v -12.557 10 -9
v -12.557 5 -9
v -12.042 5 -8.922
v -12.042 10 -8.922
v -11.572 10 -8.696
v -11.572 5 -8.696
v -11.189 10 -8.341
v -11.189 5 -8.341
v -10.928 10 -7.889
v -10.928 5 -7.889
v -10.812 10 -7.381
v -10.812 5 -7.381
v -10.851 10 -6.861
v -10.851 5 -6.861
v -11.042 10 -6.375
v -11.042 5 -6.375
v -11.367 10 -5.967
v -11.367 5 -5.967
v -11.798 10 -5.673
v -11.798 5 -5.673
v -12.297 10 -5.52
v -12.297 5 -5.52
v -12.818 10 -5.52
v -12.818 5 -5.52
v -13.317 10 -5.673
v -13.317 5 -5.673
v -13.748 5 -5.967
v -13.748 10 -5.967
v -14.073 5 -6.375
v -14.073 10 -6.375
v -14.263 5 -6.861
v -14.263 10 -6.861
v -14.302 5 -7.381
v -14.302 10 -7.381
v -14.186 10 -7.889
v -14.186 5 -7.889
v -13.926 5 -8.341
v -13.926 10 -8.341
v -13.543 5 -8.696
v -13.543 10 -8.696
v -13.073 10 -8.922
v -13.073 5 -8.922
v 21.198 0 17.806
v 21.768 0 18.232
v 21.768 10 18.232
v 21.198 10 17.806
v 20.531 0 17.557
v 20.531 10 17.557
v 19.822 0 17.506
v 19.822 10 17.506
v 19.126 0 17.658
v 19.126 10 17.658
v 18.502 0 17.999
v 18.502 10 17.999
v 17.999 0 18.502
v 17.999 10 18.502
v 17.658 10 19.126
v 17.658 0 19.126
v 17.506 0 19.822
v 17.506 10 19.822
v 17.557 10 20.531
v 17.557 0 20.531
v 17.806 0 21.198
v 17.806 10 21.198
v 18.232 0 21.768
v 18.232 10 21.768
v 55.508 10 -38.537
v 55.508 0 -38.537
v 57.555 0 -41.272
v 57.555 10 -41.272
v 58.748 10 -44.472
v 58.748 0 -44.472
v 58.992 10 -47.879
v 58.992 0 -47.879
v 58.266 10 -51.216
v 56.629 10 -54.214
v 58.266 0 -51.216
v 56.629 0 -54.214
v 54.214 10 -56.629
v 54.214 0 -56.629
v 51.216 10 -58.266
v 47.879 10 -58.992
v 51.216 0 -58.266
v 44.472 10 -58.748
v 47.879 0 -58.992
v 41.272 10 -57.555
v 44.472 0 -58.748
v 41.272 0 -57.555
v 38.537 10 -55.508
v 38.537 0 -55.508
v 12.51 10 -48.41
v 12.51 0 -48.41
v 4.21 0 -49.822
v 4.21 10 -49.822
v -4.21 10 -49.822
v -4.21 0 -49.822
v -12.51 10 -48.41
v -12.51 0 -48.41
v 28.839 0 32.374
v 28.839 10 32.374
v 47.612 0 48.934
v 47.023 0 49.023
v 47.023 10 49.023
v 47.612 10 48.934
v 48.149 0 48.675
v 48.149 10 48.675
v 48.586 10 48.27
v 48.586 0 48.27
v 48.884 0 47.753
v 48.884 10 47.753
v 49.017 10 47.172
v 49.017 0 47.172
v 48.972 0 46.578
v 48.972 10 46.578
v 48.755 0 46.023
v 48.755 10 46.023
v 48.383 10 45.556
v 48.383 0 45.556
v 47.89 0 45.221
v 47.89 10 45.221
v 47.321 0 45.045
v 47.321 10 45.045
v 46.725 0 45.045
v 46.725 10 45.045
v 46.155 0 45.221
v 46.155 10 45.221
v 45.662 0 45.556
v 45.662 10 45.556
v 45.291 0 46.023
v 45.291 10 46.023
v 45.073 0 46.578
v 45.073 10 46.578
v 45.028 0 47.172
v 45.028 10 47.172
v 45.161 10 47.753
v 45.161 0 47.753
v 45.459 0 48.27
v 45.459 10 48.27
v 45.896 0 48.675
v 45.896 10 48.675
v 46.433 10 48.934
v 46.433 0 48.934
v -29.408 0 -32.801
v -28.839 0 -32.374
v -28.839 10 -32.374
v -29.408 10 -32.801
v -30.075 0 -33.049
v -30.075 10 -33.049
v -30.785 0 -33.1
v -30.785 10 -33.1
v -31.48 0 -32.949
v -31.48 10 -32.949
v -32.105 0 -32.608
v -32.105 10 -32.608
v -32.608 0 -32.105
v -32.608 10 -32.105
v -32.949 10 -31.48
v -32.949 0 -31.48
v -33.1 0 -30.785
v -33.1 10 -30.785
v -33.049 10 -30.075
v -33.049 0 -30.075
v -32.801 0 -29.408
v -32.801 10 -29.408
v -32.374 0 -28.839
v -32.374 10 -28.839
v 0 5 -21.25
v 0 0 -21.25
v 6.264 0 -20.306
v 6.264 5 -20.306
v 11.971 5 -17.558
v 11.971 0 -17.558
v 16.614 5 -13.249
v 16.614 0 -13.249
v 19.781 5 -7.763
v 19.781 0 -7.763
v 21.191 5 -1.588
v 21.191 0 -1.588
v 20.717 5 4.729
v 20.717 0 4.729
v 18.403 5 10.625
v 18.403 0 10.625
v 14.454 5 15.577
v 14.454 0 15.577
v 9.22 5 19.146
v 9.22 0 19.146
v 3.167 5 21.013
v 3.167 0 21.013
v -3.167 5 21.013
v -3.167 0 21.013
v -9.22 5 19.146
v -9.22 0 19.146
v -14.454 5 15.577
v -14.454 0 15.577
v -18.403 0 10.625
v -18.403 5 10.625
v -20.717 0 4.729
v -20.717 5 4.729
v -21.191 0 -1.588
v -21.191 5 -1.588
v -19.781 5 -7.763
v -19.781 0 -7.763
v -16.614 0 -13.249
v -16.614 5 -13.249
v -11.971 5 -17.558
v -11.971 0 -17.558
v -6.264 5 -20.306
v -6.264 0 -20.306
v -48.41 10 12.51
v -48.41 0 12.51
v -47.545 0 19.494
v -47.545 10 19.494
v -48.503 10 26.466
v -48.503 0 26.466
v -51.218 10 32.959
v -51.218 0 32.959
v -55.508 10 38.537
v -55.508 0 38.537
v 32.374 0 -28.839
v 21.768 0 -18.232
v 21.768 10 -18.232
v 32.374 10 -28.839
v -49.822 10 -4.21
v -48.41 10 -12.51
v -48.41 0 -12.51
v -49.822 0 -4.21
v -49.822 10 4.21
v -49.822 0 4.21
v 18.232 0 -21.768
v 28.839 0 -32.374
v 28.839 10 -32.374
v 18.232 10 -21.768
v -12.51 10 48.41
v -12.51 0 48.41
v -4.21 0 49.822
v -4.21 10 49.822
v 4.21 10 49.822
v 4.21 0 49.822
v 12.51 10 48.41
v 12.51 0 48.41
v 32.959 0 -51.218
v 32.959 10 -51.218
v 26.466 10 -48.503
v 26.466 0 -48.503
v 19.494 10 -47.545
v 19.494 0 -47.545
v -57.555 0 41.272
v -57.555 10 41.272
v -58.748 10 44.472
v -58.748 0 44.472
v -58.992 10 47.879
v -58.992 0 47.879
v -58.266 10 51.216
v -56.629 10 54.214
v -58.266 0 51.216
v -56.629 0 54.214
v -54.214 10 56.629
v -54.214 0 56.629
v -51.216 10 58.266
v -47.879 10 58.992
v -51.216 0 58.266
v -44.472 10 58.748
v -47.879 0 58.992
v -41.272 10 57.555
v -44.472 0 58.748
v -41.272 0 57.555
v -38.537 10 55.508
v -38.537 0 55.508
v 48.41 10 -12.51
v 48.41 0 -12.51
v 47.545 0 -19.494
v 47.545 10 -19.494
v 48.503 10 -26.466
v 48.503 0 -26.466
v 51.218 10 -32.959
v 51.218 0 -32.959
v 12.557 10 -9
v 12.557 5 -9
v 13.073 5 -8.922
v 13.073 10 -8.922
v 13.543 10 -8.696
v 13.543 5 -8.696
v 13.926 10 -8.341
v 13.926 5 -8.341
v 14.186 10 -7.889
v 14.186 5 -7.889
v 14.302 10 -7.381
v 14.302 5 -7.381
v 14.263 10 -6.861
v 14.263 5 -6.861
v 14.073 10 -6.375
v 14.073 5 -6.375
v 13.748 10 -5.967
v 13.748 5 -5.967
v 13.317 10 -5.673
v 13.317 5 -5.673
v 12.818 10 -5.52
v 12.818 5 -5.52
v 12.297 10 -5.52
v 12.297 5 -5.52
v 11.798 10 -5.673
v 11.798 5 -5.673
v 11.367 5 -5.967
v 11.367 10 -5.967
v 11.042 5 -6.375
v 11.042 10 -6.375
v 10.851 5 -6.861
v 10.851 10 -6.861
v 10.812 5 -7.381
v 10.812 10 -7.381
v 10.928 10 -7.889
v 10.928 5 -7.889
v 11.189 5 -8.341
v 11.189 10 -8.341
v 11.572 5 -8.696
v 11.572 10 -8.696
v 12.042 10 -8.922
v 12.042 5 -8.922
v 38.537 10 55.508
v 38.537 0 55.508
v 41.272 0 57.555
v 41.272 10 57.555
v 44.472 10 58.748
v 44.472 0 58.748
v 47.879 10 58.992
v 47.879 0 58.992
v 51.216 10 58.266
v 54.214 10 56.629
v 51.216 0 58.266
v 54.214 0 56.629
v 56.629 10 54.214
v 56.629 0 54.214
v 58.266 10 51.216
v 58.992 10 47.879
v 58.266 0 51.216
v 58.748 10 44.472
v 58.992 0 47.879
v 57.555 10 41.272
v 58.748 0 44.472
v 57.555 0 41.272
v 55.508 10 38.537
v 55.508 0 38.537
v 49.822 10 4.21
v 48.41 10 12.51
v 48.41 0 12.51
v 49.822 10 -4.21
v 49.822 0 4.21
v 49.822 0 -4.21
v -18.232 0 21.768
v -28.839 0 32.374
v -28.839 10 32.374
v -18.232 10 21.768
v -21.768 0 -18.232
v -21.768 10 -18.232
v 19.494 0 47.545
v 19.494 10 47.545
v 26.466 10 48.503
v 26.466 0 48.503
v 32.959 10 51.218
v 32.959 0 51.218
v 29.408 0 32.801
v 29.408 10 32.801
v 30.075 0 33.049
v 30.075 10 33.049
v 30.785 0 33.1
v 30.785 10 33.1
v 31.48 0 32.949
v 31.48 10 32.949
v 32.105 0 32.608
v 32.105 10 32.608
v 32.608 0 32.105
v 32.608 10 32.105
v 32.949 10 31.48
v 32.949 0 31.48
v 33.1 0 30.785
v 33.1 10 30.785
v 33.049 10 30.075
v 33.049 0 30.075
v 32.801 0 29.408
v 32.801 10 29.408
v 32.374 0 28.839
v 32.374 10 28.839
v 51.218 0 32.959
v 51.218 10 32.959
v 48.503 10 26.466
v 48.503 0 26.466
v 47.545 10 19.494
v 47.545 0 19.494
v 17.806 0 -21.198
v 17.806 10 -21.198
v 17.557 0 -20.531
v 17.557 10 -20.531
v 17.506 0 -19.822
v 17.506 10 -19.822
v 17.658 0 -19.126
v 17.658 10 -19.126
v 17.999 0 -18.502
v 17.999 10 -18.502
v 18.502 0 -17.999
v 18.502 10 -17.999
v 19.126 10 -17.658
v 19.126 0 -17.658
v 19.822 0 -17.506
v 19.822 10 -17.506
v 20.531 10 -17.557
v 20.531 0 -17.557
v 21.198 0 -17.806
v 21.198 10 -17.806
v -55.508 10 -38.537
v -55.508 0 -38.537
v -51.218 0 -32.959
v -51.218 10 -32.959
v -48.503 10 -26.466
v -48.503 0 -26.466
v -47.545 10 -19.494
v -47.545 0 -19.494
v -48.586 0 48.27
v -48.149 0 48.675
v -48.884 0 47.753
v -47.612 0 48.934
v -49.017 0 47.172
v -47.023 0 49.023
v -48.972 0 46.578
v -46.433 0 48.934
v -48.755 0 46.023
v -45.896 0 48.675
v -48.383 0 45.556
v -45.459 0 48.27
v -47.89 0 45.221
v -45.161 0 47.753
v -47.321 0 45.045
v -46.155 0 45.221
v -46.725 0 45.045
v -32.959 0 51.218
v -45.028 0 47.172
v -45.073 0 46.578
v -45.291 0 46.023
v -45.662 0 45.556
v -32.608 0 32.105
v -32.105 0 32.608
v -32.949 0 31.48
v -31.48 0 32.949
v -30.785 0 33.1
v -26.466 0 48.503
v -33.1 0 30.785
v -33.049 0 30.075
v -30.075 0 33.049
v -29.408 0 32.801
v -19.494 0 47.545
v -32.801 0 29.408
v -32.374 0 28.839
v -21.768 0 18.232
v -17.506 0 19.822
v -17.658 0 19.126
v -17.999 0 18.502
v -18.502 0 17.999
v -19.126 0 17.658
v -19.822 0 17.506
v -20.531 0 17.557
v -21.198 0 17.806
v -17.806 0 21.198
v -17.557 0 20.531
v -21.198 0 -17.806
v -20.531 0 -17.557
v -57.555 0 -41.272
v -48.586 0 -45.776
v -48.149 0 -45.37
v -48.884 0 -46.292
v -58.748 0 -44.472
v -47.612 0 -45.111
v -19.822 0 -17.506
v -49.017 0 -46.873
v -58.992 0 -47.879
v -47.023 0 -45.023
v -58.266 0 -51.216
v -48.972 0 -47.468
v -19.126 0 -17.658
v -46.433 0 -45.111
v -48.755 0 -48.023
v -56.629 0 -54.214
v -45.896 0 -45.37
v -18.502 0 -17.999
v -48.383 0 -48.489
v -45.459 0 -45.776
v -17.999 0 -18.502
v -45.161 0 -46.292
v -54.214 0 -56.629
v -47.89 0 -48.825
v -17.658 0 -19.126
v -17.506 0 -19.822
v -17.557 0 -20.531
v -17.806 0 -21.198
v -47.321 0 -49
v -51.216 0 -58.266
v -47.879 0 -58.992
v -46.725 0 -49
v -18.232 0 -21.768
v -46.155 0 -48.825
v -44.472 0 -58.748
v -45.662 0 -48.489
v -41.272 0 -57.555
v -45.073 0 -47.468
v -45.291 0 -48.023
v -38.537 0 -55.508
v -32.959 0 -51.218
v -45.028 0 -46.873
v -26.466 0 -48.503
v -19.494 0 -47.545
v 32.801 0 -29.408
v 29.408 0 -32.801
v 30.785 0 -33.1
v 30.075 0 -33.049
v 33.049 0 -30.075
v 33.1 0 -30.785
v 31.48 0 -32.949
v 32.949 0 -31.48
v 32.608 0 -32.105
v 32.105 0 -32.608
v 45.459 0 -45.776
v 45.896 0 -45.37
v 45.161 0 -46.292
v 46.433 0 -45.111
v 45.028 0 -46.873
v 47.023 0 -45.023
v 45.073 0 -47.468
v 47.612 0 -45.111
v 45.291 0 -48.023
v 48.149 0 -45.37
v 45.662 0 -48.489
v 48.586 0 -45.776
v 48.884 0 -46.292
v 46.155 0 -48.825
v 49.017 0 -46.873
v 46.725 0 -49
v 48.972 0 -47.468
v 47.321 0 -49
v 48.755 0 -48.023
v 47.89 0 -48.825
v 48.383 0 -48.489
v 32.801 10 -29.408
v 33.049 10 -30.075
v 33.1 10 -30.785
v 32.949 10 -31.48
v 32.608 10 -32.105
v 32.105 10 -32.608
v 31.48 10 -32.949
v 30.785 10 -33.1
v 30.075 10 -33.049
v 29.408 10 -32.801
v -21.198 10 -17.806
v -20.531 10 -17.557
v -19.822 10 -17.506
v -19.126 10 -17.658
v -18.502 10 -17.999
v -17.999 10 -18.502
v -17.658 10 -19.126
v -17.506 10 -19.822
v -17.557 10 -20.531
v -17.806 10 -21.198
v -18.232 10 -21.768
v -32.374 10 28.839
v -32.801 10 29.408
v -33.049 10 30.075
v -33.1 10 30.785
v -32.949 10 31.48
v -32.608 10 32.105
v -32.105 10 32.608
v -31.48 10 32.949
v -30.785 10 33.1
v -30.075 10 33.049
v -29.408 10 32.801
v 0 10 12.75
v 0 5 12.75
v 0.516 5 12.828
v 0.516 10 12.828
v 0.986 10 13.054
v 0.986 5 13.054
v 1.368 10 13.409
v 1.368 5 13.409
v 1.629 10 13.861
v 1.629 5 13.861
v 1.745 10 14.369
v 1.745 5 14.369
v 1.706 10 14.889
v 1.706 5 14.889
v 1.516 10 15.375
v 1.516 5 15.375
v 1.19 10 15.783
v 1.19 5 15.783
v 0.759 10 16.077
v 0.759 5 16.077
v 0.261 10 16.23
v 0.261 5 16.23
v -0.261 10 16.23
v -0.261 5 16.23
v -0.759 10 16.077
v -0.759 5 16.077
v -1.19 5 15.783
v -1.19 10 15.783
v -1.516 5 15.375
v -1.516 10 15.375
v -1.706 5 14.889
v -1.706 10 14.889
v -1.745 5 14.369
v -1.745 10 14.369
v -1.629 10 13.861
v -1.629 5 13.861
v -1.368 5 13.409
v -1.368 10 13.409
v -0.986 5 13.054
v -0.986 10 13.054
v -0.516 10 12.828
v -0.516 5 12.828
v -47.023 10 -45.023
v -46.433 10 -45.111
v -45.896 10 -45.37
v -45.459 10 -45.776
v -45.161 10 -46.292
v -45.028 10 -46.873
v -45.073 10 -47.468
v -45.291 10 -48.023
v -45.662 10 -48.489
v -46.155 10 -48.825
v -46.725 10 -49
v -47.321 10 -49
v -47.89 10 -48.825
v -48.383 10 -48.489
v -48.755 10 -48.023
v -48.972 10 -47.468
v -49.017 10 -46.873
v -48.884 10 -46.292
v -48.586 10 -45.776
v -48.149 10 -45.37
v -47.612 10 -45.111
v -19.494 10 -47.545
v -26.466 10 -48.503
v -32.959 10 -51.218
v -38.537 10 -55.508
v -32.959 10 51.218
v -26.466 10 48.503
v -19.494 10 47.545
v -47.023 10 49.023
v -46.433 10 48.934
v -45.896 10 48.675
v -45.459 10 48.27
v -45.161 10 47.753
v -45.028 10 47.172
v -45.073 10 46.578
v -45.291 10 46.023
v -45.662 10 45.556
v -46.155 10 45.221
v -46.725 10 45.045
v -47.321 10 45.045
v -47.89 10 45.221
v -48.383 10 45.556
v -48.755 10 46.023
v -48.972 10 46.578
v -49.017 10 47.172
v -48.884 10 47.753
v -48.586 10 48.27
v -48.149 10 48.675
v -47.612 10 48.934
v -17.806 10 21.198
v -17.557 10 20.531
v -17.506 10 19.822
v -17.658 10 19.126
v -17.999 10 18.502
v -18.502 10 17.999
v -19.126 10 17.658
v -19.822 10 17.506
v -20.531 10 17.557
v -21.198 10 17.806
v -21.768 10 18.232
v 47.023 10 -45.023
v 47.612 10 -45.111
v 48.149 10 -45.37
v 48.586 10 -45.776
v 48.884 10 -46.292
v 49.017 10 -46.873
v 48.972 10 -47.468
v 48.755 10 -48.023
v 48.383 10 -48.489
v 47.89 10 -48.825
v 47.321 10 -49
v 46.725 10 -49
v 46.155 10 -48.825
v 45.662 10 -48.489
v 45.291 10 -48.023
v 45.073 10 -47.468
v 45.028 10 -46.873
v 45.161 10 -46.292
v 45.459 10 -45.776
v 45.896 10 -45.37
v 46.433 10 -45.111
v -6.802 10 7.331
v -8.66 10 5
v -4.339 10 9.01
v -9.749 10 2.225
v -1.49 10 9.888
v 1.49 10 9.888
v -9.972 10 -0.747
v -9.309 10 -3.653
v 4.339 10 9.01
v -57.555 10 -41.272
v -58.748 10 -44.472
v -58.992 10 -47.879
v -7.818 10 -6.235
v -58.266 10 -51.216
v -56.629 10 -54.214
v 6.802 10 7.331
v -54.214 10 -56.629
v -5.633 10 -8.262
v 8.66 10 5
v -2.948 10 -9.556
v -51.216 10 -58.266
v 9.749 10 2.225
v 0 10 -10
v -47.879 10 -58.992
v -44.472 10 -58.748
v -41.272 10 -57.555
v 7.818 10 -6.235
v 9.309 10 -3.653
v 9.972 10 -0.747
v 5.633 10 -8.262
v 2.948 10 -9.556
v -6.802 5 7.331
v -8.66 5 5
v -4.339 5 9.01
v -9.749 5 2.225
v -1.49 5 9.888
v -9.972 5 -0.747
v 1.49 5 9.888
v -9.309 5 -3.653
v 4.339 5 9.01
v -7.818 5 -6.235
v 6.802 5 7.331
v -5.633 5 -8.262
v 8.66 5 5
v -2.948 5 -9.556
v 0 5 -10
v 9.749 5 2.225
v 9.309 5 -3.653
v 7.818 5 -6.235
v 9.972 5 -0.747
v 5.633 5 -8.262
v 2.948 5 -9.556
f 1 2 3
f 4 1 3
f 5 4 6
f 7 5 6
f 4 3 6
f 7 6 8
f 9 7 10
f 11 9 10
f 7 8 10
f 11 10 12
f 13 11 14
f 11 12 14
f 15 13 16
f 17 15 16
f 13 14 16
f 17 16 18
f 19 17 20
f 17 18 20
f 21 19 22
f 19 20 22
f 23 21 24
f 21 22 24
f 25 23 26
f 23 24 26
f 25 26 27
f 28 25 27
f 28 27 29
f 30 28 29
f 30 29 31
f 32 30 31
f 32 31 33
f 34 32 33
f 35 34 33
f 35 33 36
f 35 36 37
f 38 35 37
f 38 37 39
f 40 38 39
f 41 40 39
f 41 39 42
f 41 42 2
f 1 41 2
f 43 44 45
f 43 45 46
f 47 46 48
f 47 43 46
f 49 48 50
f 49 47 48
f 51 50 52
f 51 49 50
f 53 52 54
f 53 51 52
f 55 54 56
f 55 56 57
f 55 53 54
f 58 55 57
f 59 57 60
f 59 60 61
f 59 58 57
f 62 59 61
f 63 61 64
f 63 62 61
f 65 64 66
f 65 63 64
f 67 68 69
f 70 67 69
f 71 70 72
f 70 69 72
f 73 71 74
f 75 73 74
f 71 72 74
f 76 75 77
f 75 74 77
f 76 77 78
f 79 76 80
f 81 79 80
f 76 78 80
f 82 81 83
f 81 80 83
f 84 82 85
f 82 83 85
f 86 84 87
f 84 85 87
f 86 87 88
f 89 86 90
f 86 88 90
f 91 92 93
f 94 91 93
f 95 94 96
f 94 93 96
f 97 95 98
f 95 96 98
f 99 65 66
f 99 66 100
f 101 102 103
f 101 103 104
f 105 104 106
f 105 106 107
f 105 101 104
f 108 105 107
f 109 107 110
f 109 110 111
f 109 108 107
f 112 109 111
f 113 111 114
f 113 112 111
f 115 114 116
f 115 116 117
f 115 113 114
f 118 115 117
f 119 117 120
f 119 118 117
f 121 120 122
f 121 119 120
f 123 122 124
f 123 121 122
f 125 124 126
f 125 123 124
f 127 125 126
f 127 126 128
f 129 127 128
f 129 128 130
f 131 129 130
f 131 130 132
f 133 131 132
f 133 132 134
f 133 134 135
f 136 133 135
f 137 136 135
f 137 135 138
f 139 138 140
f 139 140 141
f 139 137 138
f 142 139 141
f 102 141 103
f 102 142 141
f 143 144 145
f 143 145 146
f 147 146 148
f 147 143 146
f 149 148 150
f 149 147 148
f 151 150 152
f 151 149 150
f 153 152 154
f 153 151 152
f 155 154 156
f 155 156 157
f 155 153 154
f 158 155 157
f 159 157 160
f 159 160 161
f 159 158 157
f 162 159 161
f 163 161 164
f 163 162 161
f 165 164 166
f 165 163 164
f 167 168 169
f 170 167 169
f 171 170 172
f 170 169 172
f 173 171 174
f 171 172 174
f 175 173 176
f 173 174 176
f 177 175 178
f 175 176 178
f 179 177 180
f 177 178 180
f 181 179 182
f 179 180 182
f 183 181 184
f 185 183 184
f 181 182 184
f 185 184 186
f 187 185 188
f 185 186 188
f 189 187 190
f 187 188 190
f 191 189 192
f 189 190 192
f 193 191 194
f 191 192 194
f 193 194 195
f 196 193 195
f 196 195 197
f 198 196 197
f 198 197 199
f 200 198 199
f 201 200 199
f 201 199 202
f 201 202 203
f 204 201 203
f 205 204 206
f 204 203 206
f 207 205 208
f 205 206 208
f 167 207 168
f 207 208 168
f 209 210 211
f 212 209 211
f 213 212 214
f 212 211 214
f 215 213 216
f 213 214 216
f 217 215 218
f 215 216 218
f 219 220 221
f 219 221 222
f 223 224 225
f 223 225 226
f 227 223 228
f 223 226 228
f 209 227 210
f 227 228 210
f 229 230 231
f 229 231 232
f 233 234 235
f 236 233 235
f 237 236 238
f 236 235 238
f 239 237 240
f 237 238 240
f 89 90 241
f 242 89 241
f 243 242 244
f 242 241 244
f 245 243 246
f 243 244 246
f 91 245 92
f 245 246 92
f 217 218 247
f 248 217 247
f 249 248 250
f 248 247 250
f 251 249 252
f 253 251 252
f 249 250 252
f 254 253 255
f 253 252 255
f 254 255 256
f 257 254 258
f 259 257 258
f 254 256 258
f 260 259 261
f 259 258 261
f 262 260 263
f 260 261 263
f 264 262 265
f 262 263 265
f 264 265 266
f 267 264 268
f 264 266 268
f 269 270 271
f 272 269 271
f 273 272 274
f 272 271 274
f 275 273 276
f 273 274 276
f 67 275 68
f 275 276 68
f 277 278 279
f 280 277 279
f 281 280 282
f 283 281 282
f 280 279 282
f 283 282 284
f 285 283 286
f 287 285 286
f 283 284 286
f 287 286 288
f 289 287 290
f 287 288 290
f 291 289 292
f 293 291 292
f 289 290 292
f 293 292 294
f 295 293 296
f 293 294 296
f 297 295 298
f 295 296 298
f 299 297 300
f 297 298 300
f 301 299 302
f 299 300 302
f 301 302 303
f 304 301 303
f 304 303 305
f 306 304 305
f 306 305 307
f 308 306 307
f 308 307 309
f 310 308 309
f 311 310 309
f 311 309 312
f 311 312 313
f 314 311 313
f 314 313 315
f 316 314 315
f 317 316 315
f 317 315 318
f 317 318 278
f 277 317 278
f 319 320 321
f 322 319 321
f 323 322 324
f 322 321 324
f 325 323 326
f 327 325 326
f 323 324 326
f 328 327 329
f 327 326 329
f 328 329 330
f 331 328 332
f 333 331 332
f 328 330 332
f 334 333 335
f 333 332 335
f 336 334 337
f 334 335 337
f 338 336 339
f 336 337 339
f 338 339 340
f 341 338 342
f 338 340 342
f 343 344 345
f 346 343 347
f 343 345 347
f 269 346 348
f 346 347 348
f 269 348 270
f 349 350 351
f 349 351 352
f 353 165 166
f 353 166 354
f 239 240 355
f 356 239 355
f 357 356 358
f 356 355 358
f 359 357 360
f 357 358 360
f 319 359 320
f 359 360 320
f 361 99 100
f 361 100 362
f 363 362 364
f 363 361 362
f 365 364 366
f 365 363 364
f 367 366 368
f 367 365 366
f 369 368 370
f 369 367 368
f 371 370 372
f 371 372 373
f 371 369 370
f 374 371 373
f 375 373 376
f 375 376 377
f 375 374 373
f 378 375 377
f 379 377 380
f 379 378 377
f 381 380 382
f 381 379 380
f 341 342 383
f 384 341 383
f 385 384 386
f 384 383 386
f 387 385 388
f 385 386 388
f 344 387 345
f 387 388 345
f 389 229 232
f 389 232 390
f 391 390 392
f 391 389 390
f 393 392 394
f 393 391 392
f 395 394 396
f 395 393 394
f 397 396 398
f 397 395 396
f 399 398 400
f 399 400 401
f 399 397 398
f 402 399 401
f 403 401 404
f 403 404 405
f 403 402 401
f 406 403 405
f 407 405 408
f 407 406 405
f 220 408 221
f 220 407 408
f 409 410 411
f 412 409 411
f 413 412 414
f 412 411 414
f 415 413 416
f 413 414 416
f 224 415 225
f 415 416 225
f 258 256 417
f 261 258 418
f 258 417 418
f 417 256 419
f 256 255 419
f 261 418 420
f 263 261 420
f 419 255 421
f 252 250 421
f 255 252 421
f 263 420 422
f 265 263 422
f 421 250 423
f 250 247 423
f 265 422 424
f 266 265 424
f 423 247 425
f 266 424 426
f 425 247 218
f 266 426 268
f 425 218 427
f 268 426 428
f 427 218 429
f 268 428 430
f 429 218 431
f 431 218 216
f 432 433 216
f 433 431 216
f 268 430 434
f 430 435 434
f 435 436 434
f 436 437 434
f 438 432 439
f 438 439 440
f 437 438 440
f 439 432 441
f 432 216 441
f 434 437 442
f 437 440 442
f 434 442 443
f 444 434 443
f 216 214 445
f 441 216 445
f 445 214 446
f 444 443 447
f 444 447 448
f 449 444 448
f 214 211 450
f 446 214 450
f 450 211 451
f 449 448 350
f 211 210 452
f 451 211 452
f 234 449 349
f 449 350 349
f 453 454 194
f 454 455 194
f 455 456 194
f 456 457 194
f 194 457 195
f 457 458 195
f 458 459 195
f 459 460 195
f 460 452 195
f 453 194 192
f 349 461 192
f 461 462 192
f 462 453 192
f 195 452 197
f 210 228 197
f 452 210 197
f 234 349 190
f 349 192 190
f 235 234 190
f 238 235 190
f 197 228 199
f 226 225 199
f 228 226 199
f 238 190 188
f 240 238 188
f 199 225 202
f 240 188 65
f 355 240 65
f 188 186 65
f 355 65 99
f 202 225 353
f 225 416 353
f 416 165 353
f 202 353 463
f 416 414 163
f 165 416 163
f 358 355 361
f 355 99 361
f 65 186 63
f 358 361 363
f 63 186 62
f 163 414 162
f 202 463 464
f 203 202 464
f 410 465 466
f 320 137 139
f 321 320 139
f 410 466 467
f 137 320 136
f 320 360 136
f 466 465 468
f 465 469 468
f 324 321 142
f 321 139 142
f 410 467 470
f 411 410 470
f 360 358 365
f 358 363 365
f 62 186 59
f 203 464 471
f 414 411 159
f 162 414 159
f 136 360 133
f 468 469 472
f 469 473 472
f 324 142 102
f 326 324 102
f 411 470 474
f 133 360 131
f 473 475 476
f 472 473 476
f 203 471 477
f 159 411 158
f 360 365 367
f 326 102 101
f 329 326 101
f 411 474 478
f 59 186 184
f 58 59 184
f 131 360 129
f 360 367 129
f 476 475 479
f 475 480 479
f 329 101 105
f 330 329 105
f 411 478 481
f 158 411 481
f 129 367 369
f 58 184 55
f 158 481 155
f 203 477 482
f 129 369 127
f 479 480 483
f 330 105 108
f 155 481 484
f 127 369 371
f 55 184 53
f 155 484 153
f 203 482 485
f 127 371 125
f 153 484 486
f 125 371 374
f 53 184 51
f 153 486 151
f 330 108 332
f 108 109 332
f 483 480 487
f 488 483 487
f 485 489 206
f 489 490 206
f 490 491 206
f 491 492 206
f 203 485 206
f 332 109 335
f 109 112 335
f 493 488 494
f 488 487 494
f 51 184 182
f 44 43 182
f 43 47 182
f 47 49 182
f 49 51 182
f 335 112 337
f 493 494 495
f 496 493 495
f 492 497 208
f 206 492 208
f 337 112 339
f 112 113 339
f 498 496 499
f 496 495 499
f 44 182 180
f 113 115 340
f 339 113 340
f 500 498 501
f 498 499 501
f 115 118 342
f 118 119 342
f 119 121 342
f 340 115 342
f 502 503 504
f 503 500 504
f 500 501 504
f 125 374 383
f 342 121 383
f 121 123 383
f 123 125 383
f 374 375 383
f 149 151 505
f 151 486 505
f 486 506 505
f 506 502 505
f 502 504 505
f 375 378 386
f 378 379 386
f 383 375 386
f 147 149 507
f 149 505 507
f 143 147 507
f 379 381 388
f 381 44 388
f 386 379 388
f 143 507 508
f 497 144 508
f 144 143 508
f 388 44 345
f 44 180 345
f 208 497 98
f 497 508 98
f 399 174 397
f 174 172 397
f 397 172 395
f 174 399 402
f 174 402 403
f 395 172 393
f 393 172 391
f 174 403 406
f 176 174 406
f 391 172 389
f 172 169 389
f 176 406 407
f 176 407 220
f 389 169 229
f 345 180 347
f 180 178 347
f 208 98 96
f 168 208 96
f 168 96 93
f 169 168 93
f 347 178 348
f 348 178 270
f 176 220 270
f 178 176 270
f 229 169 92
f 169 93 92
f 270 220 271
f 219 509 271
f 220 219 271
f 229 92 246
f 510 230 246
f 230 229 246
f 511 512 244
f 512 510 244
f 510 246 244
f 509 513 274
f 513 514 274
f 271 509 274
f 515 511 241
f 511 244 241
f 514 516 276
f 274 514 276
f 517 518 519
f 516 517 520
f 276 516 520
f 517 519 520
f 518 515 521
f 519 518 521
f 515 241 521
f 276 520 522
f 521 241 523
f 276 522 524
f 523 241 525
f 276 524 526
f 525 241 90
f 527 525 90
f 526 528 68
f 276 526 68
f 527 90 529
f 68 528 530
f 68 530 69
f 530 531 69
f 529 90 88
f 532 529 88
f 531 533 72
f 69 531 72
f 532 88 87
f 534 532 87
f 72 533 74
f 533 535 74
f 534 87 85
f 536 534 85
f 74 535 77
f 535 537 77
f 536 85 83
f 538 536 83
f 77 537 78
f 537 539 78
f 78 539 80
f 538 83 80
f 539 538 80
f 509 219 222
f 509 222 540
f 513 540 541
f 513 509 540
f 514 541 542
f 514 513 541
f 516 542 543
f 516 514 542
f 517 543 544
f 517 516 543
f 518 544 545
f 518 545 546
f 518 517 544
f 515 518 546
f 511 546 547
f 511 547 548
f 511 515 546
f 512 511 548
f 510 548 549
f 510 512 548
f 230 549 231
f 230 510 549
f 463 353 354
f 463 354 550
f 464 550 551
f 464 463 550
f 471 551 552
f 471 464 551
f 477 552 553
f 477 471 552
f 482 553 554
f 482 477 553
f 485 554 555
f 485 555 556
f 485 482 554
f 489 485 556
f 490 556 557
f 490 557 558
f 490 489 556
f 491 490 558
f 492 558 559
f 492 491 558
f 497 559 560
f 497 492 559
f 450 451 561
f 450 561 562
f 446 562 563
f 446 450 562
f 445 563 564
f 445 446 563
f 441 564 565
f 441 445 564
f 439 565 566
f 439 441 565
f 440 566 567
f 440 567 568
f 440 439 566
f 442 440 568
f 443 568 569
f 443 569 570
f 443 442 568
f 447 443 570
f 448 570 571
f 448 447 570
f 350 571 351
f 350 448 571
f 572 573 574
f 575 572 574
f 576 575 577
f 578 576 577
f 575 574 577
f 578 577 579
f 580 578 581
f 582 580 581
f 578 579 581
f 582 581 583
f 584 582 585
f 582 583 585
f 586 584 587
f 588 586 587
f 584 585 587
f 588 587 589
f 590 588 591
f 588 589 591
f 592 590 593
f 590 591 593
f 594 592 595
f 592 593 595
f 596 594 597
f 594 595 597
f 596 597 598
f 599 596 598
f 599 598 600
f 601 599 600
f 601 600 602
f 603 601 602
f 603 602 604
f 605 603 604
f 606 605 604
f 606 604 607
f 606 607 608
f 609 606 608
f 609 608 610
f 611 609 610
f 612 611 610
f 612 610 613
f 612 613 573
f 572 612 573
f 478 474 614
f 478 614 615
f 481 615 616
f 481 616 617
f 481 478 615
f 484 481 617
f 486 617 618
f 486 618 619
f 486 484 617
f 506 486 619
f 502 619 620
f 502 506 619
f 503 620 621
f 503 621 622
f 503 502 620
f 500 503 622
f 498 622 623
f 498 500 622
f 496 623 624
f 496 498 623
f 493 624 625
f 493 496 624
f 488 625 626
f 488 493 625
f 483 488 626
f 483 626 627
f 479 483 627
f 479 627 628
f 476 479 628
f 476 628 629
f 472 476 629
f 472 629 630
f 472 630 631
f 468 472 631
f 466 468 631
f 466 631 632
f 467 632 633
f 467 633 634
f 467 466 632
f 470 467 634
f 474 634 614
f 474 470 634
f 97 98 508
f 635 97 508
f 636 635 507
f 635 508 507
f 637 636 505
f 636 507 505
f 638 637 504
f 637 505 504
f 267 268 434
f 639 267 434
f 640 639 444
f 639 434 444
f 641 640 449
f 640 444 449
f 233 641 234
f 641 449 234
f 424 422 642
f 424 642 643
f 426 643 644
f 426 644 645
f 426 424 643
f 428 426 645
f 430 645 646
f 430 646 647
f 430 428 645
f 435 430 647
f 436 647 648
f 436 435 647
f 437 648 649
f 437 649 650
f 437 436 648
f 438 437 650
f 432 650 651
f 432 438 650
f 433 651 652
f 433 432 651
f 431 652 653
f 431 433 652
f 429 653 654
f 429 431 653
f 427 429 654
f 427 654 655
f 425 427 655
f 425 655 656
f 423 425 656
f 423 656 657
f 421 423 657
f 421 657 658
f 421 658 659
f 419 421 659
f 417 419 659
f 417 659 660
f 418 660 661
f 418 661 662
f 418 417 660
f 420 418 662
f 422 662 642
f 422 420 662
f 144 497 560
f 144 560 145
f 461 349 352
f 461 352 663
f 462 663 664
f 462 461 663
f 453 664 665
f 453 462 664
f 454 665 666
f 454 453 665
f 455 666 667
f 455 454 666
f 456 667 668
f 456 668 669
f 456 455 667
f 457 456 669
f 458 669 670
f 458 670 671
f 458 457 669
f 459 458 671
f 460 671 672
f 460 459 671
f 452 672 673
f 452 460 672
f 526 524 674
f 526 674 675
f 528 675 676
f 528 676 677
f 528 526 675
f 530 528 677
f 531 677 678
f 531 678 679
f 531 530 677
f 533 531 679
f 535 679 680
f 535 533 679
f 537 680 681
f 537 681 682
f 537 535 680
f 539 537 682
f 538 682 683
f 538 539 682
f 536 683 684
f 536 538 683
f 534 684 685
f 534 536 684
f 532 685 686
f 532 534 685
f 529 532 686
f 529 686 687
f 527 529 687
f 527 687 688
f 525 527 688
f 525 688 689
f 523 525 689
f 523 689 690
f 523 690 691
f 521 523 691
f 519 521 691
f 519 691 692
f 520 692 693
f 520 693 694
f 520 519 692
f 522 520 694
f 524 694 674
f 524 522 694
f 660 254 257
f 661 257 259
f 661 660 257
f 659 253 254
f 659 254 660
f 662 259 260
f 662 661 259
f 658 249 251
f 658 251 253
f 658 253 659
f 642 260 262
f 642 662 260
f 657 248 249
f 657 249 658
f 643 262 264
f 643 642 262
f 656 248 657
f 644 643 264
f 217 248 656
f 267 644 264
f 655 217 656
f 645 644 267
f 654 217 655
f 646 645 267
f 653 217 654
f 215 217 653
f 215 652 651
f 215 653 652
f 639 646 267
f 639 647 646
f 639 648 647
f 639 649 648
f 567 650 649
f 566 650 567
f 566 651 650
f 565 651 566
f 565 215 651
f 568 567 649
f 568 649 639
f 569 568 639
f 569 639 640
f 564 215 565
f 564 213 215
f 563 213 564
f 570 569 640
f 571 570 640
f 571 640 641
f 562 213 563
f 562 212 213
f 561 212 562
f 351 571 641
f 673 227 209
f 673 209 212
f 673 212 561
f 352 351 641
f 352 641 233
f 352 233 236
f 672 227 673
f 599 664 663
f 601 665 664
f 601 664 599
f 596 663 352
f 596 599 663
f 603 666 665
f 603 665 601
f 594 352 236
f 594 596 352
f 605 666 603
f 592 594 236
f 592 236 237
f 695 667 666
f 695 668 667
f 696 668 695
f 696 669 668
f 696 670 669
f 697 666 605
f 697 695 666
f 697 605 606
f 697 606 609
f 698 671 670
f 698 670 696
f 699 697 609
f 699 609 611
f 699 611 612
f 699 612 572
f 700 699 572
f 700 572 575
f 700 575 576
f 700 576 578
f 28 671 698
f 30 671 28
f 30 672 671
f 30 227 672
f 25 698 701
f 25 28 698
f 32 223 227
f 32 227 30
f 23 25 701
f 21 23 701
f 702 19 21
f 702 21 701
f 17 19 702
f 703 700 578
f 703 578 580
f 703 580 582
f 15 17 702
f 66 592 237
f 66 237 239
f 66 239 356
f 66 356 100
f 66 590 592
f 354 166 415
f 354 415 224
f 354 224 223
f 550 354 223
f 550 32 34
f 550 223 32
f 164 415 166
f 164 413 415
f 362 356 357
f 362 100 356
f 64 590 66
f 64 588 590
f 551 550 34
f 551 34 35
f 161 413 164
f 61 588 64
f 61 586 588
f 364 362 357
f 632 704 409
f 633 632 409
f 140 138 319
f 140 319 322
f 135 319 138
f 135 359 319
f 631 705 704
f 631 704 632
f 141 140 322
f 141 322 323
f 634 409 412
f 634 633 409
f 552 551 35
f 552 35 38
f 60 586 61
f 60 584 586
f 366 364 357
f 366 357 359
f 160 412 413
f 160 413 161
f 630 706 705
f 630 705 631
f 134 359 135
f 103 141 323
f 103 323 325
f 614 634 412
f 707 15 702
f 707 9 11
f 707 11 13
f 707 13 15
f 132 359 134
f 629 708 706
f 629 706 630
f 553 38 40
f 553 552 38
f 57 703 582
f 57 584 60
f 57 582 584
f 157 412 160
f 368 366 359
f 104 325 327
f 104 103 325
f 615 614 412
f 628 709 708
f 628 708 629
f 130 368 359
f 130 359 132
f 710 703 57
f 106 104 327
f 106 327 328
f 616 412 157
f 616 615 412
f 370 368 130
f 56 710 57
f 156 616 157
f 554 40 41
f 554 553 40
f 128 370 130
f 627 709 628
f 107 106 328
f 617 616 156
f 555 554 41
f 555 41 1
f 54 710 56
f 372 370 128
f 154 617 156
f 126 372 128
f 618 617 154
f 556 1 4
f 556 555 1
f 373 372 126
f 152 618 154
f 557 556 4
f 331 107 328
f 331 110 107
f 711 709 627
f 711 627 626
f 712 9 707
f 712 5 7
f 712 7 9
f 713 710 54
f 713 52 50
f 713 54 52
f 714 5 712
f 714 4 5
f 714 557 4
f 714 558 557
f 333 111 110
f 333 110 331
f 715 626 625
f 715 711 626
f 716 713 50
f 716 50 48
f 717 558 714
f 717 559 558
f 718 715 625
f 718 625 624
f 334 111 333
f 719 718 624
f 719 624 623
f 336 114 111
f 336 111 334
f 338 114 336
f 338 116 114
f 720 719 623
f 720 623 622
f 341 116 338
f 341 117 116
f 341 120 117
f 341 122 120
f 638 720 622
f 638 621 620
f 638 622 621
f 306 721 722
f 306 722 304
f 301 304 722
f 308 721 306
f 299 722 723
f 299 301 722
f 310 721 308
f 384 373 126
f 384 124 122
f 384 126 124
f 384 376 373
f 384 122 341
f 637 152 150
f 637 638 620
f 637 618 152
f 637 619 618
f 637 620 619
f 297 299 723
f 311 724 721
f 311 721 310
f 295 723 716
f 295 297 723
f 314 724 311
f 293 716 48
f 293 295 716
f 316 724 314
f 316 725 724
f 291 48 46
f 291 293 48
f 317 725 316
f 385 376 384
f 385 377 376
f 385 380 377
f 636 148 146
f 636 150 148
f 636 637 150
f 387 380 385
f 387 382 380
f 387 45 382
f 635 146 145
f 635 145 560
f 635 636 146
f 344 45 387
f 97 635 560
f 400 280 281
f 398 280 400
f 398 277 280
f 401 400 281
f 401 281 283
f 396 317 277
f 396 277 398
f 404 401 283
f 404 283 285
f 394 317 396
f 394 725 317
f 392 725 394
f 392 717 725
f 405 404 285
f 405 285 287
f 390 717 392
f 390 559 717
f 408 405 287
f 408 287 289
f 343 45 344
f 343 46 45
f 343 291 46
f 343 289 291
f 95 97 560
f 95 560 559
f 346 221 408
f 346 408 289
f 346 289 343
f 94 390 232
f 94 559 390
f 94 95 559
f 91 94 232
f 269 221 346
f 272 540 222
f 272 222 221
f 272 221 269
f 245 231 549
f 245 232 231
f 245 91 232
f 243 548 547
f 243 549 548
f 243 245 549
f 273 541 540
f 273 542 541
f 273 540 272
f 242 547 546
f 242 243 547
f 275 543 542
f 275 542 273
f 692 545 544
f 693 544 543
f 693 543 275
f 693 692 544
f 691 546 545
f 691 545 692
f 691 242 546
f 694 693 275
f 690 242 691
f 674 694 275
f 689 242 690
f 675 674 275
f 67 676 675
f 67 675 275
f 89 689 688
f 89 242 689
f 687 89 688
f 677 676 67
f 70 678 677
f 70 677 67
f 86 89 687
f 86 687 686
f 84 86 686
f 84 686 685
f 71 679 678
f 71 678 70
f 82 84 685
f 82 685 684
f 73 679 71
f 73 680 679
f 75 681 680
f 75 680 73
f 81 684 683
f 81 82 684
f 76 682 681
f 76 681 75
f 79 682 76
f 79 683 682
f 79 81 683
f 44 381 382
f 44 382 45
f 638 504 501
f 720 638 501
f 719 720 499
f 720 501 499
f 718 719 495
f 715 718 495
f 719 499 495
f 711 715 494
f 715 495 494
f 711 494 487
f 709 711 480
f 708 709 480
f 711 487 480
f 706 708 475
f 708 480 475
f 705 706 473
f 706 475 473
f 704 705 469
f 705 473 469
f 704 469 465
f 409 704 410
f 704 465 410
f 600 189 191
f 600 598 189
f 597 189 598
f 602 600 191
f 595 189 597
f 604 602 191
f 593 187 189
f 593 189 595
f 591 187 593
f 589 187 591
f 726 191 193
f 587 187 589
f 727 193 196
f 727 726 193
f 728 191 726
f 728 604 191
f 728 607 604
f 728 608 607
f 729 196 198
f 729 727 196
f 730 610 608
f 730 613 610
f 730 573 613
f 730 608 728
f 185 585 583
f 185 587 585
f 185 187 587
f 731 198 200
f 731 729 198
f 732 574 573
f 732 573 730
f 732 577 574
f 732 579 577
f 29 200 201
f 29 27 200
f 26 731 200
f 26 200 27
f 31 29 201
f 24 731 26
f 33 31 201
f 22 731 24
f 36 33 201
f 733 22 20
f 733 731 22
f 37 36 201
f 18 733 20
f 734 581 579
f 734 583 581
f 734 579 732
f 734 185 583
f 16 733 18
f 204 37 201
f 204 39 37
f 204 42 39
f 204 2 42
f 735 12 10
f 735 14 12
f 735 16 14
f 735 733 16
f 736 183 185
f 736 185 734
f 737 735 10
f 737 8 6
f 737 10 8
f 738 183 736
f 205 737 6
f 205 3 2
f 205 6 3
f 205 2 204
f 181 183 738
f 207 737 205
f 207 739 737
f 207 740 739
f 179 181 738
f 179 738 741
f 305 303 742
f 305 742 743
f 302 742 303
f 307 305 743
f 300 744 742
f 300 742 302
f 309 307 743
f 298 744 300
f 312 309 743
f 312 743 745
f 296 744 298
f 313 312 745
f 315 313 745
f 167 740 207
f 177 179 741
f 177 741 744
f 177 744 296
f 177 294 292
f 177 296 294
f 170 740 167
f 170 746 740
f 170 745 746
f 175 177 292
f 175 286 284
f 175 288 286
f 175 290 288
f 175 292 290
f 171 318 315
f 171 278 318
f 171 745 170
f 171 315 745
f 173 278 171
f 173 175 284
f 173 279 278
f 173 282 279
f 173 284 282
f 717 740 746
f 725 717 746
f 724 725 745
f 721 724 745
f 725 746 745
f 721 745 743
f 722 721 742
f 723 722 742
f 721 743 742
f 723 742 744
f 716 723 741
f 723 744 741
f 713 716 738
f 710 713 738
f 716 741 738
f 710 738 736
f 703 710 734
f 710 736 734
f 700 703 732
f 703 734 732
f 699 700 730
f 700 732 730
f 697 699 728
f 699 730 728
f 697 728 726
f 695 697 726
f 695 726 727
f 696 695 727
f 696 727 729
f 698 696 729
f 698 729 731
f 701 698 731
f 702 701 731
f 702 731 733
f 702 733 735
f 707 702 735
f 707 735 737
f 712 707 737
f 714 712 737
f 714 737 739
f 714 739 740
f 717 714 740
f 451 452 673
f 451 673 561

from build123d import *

# Parameters (mm, degrees)
SKETCH1_R           = 2
BOSS_EXTRUDE1_DEPTH = 10
SKETCH2_R           = 21.25
CUT_EXTRUDE1_DEPTH  = 5
SKETCH2_3_R         = 1.75
CUT_EXTRUDE2_DEPTH  = 85.067442245
SKETCH4_R           = 10
CUT_EXTRUDE3_DEPTH  = 84.620182047


with BuildPart() as part:
    # Sketch1 → Boss-Extrude1 (new body)
    with BuildSketch(Plane(origin=(0, 0, 0), x_dir=(1, 0, 0), z_dir=(0, 1, 0))):
        with BuildLine():
            ThreePointArc((48.409618097, -12.510350744), (50, 0), (48.409618097, 12.510350744))
            ThreePointArc((48.409618097, 12.510350744), (48.502831547, 26.466358431), (55.507882323, 38.537319575))
            ThreePointArc((55.507882323, 38.537319575), (55.507882323, 55.507882323), (38.537319575, 55.507882323))
            ThreePointArc((38.537319575, 55.507882323), (26.466358431, 48.502831547), (12.510350744, 48.409618097))
            ThreePointArc((12.510350744, 48.409618097), (0, 50), (-12.510350744, 48.409618097))
            ThreePointArc((-12.510350744, 48.409618097), (-26.466358431, 48.502831547), (-38.537319575, 55.507882323))
            ThreePointArc((-38.537319575, 55.507882323), (-55.507882323, 55.507882323), (-55.507882323, 38.537319575))
            ThreePointArc((-55.507882323, 38.537319575), (-48.502831547, 26.466358431), (-48.409618097, 12.510350744))
            ThreePointArc((-48.409618097, 12.510350744), (-50, 0), (-48.409618097, -12.510350744))
            ThreePointArc((-48.409618097, -12.510350744), (-48.502831547, -26.466358431), (-55.507882323, -38.537319575))
            ThreePointArc((-55.507882323, -38.537319575), (-55.507882323, -55.507882323), (-38.537319575, -55.507882323))
            ThreePointArc((-38.537319575, -55.507882323), (-26.466358431, -48.502831547), (-12.510350744, -48.409618097))
            ThreePointArc((-12.510350744, -48.409618097), (0, -50), (12.510350744, -48.409618097))
            ThreePointArc((12.510350744, -48.409618097), (26.466358431, -48.502831547), (38.537319575, -55.507882323))
            ThreePointArc((38.537319575, -55.507882323), (55.507882323, -55.507882323), (55.507882323, -38.537319575))
            ThreePointArc((55.507882323, -38.537319575), (48.502831547, -26.466358431), (48.409618097, -12.510350744))
        make_face()
        with BuildLine():
            ThreePointArc((-21.767766953, -18.232233047), (-18.232233047, -18.232233047), (-18.232233047, -21.767766953))
            Line((-18.232233047, -21.767766953), (-28.838834765, -32.374368671))
            ThreePointArc((-28.838834765, -32.374368671), (-32.374368671, -32.374368671), (-32.374368671, -28.838834765))
            Line((-32.374368671, -28.838834765), (-21.767766953, -18.232233047))
        make_face(mode=Mode.SUBTRACT)
        with BuildLine():
            ThreePointArc((18.232233047, -21.767766953), (18.232233047, -18.232233047), (21.767766953, -18.232233047))
            Line((21.767766953, -18.232233047), (32.374368671, -28.838834765))
            ThreePointArc((32.374368671, -28.838834765), (32.374368671, -32.374368671), (28.838834765, -32.374368671))
            Line((28.838834765, -32.374368671), (18.232233047, -21.767766953))
        make_face(mode=Mode.SUBTRACT)
        with BuildLine():
            ThreePointArc((-18.232233047, 21.767766953), (-18.232233047, 18.232233047), (-21.767766953, 18.232233047))
            Line((-21.767766953, 18.232233047), (-32.374368671, 28.838834765))
            ThreePointArc((-32.374368671, 28.838834765), (-32.374368671, 32.374368671), (-28.838834765, 32.374368671))
            Line((-28.838834765, 32.374368671), (-18.232233047, 21.767766953))
        make_face(mode=Mode.SUBTRACT)
        with BuildLine():
            ThreePointArc((21.767766953, 18.232233047), (18.232233047, 18.232233047), (18.232233047, 21.767766953))
            Line((18.232233047, 21.767766953), (28.838834765, 32.374368671))
            ThreePointArc((28.838834765, 32.374368671), (32.374368671, 32.374368671), (32.374368671, 28.838834765))
            Line((32.374368671, 28.838834765), (21.767766953, 18.232233047))
        make_face(mode=Mode.SUBTRACT)
        with Locations((47.022600949, -47.022600949)):
            Circle(SKETCH1_R, mode=Mode.SUBTRACT)
        with Locations((-47.022600949, -47.022600949)):
            Circle(SKETCH1_R, mode=Mode.SUBTRACT)
        with Locations((-47.022600949, 47.022600949)):
            Circle(SKETCH1_R, mode=Mode.SUBTRACT)
        with Locations((47.022600949, 47.022600949)):
            Circle(SKETCH1_R, mode=Mode.SUBTRACT)
    extrude(amount=BOSS_EXTRUDE1_DEPTH)

    # Sketch2 → Cut-Extrude1 (cut)
    with BuildSketch(Plane.XZ):
        Circle(SKETCH2_R)
    extrude(amount=-CUT_EXTRUDE1_DEPTH, mode=Mode.SUBTRACT)

    # Sketch2<3> → Cut-Extrude2 (cut, through all)
    with BuildSketch(Plane.XZ):
        with Locations((0, 14.5)):
            Circle(SKETCH2_3_R)
        with Locations((12.557368355, -7.25)):
            Circle(SKETCH2_3_R)
        with Locations((-12.557368355, -7.25)):
            Circle(SKETCH2_3_R)
    extrude(amount=-CUT_EXTRUDE2_DEPTH, mode=Mode.SUBTRACT)

    # Sketch4 → Cut-Extrude3 (cut, through all)
    with BuildSketch(Plane(origin=(0, 5, 0), x_dir=(-1, 0, 0), z_dir=(0, -1, 0))):
        Circle(SKETCH4_R)
    extrude(amount=-CUT_EXTRUDE3_DEPTH, mode=Mode.SUBTRACT)


solid = part.part
